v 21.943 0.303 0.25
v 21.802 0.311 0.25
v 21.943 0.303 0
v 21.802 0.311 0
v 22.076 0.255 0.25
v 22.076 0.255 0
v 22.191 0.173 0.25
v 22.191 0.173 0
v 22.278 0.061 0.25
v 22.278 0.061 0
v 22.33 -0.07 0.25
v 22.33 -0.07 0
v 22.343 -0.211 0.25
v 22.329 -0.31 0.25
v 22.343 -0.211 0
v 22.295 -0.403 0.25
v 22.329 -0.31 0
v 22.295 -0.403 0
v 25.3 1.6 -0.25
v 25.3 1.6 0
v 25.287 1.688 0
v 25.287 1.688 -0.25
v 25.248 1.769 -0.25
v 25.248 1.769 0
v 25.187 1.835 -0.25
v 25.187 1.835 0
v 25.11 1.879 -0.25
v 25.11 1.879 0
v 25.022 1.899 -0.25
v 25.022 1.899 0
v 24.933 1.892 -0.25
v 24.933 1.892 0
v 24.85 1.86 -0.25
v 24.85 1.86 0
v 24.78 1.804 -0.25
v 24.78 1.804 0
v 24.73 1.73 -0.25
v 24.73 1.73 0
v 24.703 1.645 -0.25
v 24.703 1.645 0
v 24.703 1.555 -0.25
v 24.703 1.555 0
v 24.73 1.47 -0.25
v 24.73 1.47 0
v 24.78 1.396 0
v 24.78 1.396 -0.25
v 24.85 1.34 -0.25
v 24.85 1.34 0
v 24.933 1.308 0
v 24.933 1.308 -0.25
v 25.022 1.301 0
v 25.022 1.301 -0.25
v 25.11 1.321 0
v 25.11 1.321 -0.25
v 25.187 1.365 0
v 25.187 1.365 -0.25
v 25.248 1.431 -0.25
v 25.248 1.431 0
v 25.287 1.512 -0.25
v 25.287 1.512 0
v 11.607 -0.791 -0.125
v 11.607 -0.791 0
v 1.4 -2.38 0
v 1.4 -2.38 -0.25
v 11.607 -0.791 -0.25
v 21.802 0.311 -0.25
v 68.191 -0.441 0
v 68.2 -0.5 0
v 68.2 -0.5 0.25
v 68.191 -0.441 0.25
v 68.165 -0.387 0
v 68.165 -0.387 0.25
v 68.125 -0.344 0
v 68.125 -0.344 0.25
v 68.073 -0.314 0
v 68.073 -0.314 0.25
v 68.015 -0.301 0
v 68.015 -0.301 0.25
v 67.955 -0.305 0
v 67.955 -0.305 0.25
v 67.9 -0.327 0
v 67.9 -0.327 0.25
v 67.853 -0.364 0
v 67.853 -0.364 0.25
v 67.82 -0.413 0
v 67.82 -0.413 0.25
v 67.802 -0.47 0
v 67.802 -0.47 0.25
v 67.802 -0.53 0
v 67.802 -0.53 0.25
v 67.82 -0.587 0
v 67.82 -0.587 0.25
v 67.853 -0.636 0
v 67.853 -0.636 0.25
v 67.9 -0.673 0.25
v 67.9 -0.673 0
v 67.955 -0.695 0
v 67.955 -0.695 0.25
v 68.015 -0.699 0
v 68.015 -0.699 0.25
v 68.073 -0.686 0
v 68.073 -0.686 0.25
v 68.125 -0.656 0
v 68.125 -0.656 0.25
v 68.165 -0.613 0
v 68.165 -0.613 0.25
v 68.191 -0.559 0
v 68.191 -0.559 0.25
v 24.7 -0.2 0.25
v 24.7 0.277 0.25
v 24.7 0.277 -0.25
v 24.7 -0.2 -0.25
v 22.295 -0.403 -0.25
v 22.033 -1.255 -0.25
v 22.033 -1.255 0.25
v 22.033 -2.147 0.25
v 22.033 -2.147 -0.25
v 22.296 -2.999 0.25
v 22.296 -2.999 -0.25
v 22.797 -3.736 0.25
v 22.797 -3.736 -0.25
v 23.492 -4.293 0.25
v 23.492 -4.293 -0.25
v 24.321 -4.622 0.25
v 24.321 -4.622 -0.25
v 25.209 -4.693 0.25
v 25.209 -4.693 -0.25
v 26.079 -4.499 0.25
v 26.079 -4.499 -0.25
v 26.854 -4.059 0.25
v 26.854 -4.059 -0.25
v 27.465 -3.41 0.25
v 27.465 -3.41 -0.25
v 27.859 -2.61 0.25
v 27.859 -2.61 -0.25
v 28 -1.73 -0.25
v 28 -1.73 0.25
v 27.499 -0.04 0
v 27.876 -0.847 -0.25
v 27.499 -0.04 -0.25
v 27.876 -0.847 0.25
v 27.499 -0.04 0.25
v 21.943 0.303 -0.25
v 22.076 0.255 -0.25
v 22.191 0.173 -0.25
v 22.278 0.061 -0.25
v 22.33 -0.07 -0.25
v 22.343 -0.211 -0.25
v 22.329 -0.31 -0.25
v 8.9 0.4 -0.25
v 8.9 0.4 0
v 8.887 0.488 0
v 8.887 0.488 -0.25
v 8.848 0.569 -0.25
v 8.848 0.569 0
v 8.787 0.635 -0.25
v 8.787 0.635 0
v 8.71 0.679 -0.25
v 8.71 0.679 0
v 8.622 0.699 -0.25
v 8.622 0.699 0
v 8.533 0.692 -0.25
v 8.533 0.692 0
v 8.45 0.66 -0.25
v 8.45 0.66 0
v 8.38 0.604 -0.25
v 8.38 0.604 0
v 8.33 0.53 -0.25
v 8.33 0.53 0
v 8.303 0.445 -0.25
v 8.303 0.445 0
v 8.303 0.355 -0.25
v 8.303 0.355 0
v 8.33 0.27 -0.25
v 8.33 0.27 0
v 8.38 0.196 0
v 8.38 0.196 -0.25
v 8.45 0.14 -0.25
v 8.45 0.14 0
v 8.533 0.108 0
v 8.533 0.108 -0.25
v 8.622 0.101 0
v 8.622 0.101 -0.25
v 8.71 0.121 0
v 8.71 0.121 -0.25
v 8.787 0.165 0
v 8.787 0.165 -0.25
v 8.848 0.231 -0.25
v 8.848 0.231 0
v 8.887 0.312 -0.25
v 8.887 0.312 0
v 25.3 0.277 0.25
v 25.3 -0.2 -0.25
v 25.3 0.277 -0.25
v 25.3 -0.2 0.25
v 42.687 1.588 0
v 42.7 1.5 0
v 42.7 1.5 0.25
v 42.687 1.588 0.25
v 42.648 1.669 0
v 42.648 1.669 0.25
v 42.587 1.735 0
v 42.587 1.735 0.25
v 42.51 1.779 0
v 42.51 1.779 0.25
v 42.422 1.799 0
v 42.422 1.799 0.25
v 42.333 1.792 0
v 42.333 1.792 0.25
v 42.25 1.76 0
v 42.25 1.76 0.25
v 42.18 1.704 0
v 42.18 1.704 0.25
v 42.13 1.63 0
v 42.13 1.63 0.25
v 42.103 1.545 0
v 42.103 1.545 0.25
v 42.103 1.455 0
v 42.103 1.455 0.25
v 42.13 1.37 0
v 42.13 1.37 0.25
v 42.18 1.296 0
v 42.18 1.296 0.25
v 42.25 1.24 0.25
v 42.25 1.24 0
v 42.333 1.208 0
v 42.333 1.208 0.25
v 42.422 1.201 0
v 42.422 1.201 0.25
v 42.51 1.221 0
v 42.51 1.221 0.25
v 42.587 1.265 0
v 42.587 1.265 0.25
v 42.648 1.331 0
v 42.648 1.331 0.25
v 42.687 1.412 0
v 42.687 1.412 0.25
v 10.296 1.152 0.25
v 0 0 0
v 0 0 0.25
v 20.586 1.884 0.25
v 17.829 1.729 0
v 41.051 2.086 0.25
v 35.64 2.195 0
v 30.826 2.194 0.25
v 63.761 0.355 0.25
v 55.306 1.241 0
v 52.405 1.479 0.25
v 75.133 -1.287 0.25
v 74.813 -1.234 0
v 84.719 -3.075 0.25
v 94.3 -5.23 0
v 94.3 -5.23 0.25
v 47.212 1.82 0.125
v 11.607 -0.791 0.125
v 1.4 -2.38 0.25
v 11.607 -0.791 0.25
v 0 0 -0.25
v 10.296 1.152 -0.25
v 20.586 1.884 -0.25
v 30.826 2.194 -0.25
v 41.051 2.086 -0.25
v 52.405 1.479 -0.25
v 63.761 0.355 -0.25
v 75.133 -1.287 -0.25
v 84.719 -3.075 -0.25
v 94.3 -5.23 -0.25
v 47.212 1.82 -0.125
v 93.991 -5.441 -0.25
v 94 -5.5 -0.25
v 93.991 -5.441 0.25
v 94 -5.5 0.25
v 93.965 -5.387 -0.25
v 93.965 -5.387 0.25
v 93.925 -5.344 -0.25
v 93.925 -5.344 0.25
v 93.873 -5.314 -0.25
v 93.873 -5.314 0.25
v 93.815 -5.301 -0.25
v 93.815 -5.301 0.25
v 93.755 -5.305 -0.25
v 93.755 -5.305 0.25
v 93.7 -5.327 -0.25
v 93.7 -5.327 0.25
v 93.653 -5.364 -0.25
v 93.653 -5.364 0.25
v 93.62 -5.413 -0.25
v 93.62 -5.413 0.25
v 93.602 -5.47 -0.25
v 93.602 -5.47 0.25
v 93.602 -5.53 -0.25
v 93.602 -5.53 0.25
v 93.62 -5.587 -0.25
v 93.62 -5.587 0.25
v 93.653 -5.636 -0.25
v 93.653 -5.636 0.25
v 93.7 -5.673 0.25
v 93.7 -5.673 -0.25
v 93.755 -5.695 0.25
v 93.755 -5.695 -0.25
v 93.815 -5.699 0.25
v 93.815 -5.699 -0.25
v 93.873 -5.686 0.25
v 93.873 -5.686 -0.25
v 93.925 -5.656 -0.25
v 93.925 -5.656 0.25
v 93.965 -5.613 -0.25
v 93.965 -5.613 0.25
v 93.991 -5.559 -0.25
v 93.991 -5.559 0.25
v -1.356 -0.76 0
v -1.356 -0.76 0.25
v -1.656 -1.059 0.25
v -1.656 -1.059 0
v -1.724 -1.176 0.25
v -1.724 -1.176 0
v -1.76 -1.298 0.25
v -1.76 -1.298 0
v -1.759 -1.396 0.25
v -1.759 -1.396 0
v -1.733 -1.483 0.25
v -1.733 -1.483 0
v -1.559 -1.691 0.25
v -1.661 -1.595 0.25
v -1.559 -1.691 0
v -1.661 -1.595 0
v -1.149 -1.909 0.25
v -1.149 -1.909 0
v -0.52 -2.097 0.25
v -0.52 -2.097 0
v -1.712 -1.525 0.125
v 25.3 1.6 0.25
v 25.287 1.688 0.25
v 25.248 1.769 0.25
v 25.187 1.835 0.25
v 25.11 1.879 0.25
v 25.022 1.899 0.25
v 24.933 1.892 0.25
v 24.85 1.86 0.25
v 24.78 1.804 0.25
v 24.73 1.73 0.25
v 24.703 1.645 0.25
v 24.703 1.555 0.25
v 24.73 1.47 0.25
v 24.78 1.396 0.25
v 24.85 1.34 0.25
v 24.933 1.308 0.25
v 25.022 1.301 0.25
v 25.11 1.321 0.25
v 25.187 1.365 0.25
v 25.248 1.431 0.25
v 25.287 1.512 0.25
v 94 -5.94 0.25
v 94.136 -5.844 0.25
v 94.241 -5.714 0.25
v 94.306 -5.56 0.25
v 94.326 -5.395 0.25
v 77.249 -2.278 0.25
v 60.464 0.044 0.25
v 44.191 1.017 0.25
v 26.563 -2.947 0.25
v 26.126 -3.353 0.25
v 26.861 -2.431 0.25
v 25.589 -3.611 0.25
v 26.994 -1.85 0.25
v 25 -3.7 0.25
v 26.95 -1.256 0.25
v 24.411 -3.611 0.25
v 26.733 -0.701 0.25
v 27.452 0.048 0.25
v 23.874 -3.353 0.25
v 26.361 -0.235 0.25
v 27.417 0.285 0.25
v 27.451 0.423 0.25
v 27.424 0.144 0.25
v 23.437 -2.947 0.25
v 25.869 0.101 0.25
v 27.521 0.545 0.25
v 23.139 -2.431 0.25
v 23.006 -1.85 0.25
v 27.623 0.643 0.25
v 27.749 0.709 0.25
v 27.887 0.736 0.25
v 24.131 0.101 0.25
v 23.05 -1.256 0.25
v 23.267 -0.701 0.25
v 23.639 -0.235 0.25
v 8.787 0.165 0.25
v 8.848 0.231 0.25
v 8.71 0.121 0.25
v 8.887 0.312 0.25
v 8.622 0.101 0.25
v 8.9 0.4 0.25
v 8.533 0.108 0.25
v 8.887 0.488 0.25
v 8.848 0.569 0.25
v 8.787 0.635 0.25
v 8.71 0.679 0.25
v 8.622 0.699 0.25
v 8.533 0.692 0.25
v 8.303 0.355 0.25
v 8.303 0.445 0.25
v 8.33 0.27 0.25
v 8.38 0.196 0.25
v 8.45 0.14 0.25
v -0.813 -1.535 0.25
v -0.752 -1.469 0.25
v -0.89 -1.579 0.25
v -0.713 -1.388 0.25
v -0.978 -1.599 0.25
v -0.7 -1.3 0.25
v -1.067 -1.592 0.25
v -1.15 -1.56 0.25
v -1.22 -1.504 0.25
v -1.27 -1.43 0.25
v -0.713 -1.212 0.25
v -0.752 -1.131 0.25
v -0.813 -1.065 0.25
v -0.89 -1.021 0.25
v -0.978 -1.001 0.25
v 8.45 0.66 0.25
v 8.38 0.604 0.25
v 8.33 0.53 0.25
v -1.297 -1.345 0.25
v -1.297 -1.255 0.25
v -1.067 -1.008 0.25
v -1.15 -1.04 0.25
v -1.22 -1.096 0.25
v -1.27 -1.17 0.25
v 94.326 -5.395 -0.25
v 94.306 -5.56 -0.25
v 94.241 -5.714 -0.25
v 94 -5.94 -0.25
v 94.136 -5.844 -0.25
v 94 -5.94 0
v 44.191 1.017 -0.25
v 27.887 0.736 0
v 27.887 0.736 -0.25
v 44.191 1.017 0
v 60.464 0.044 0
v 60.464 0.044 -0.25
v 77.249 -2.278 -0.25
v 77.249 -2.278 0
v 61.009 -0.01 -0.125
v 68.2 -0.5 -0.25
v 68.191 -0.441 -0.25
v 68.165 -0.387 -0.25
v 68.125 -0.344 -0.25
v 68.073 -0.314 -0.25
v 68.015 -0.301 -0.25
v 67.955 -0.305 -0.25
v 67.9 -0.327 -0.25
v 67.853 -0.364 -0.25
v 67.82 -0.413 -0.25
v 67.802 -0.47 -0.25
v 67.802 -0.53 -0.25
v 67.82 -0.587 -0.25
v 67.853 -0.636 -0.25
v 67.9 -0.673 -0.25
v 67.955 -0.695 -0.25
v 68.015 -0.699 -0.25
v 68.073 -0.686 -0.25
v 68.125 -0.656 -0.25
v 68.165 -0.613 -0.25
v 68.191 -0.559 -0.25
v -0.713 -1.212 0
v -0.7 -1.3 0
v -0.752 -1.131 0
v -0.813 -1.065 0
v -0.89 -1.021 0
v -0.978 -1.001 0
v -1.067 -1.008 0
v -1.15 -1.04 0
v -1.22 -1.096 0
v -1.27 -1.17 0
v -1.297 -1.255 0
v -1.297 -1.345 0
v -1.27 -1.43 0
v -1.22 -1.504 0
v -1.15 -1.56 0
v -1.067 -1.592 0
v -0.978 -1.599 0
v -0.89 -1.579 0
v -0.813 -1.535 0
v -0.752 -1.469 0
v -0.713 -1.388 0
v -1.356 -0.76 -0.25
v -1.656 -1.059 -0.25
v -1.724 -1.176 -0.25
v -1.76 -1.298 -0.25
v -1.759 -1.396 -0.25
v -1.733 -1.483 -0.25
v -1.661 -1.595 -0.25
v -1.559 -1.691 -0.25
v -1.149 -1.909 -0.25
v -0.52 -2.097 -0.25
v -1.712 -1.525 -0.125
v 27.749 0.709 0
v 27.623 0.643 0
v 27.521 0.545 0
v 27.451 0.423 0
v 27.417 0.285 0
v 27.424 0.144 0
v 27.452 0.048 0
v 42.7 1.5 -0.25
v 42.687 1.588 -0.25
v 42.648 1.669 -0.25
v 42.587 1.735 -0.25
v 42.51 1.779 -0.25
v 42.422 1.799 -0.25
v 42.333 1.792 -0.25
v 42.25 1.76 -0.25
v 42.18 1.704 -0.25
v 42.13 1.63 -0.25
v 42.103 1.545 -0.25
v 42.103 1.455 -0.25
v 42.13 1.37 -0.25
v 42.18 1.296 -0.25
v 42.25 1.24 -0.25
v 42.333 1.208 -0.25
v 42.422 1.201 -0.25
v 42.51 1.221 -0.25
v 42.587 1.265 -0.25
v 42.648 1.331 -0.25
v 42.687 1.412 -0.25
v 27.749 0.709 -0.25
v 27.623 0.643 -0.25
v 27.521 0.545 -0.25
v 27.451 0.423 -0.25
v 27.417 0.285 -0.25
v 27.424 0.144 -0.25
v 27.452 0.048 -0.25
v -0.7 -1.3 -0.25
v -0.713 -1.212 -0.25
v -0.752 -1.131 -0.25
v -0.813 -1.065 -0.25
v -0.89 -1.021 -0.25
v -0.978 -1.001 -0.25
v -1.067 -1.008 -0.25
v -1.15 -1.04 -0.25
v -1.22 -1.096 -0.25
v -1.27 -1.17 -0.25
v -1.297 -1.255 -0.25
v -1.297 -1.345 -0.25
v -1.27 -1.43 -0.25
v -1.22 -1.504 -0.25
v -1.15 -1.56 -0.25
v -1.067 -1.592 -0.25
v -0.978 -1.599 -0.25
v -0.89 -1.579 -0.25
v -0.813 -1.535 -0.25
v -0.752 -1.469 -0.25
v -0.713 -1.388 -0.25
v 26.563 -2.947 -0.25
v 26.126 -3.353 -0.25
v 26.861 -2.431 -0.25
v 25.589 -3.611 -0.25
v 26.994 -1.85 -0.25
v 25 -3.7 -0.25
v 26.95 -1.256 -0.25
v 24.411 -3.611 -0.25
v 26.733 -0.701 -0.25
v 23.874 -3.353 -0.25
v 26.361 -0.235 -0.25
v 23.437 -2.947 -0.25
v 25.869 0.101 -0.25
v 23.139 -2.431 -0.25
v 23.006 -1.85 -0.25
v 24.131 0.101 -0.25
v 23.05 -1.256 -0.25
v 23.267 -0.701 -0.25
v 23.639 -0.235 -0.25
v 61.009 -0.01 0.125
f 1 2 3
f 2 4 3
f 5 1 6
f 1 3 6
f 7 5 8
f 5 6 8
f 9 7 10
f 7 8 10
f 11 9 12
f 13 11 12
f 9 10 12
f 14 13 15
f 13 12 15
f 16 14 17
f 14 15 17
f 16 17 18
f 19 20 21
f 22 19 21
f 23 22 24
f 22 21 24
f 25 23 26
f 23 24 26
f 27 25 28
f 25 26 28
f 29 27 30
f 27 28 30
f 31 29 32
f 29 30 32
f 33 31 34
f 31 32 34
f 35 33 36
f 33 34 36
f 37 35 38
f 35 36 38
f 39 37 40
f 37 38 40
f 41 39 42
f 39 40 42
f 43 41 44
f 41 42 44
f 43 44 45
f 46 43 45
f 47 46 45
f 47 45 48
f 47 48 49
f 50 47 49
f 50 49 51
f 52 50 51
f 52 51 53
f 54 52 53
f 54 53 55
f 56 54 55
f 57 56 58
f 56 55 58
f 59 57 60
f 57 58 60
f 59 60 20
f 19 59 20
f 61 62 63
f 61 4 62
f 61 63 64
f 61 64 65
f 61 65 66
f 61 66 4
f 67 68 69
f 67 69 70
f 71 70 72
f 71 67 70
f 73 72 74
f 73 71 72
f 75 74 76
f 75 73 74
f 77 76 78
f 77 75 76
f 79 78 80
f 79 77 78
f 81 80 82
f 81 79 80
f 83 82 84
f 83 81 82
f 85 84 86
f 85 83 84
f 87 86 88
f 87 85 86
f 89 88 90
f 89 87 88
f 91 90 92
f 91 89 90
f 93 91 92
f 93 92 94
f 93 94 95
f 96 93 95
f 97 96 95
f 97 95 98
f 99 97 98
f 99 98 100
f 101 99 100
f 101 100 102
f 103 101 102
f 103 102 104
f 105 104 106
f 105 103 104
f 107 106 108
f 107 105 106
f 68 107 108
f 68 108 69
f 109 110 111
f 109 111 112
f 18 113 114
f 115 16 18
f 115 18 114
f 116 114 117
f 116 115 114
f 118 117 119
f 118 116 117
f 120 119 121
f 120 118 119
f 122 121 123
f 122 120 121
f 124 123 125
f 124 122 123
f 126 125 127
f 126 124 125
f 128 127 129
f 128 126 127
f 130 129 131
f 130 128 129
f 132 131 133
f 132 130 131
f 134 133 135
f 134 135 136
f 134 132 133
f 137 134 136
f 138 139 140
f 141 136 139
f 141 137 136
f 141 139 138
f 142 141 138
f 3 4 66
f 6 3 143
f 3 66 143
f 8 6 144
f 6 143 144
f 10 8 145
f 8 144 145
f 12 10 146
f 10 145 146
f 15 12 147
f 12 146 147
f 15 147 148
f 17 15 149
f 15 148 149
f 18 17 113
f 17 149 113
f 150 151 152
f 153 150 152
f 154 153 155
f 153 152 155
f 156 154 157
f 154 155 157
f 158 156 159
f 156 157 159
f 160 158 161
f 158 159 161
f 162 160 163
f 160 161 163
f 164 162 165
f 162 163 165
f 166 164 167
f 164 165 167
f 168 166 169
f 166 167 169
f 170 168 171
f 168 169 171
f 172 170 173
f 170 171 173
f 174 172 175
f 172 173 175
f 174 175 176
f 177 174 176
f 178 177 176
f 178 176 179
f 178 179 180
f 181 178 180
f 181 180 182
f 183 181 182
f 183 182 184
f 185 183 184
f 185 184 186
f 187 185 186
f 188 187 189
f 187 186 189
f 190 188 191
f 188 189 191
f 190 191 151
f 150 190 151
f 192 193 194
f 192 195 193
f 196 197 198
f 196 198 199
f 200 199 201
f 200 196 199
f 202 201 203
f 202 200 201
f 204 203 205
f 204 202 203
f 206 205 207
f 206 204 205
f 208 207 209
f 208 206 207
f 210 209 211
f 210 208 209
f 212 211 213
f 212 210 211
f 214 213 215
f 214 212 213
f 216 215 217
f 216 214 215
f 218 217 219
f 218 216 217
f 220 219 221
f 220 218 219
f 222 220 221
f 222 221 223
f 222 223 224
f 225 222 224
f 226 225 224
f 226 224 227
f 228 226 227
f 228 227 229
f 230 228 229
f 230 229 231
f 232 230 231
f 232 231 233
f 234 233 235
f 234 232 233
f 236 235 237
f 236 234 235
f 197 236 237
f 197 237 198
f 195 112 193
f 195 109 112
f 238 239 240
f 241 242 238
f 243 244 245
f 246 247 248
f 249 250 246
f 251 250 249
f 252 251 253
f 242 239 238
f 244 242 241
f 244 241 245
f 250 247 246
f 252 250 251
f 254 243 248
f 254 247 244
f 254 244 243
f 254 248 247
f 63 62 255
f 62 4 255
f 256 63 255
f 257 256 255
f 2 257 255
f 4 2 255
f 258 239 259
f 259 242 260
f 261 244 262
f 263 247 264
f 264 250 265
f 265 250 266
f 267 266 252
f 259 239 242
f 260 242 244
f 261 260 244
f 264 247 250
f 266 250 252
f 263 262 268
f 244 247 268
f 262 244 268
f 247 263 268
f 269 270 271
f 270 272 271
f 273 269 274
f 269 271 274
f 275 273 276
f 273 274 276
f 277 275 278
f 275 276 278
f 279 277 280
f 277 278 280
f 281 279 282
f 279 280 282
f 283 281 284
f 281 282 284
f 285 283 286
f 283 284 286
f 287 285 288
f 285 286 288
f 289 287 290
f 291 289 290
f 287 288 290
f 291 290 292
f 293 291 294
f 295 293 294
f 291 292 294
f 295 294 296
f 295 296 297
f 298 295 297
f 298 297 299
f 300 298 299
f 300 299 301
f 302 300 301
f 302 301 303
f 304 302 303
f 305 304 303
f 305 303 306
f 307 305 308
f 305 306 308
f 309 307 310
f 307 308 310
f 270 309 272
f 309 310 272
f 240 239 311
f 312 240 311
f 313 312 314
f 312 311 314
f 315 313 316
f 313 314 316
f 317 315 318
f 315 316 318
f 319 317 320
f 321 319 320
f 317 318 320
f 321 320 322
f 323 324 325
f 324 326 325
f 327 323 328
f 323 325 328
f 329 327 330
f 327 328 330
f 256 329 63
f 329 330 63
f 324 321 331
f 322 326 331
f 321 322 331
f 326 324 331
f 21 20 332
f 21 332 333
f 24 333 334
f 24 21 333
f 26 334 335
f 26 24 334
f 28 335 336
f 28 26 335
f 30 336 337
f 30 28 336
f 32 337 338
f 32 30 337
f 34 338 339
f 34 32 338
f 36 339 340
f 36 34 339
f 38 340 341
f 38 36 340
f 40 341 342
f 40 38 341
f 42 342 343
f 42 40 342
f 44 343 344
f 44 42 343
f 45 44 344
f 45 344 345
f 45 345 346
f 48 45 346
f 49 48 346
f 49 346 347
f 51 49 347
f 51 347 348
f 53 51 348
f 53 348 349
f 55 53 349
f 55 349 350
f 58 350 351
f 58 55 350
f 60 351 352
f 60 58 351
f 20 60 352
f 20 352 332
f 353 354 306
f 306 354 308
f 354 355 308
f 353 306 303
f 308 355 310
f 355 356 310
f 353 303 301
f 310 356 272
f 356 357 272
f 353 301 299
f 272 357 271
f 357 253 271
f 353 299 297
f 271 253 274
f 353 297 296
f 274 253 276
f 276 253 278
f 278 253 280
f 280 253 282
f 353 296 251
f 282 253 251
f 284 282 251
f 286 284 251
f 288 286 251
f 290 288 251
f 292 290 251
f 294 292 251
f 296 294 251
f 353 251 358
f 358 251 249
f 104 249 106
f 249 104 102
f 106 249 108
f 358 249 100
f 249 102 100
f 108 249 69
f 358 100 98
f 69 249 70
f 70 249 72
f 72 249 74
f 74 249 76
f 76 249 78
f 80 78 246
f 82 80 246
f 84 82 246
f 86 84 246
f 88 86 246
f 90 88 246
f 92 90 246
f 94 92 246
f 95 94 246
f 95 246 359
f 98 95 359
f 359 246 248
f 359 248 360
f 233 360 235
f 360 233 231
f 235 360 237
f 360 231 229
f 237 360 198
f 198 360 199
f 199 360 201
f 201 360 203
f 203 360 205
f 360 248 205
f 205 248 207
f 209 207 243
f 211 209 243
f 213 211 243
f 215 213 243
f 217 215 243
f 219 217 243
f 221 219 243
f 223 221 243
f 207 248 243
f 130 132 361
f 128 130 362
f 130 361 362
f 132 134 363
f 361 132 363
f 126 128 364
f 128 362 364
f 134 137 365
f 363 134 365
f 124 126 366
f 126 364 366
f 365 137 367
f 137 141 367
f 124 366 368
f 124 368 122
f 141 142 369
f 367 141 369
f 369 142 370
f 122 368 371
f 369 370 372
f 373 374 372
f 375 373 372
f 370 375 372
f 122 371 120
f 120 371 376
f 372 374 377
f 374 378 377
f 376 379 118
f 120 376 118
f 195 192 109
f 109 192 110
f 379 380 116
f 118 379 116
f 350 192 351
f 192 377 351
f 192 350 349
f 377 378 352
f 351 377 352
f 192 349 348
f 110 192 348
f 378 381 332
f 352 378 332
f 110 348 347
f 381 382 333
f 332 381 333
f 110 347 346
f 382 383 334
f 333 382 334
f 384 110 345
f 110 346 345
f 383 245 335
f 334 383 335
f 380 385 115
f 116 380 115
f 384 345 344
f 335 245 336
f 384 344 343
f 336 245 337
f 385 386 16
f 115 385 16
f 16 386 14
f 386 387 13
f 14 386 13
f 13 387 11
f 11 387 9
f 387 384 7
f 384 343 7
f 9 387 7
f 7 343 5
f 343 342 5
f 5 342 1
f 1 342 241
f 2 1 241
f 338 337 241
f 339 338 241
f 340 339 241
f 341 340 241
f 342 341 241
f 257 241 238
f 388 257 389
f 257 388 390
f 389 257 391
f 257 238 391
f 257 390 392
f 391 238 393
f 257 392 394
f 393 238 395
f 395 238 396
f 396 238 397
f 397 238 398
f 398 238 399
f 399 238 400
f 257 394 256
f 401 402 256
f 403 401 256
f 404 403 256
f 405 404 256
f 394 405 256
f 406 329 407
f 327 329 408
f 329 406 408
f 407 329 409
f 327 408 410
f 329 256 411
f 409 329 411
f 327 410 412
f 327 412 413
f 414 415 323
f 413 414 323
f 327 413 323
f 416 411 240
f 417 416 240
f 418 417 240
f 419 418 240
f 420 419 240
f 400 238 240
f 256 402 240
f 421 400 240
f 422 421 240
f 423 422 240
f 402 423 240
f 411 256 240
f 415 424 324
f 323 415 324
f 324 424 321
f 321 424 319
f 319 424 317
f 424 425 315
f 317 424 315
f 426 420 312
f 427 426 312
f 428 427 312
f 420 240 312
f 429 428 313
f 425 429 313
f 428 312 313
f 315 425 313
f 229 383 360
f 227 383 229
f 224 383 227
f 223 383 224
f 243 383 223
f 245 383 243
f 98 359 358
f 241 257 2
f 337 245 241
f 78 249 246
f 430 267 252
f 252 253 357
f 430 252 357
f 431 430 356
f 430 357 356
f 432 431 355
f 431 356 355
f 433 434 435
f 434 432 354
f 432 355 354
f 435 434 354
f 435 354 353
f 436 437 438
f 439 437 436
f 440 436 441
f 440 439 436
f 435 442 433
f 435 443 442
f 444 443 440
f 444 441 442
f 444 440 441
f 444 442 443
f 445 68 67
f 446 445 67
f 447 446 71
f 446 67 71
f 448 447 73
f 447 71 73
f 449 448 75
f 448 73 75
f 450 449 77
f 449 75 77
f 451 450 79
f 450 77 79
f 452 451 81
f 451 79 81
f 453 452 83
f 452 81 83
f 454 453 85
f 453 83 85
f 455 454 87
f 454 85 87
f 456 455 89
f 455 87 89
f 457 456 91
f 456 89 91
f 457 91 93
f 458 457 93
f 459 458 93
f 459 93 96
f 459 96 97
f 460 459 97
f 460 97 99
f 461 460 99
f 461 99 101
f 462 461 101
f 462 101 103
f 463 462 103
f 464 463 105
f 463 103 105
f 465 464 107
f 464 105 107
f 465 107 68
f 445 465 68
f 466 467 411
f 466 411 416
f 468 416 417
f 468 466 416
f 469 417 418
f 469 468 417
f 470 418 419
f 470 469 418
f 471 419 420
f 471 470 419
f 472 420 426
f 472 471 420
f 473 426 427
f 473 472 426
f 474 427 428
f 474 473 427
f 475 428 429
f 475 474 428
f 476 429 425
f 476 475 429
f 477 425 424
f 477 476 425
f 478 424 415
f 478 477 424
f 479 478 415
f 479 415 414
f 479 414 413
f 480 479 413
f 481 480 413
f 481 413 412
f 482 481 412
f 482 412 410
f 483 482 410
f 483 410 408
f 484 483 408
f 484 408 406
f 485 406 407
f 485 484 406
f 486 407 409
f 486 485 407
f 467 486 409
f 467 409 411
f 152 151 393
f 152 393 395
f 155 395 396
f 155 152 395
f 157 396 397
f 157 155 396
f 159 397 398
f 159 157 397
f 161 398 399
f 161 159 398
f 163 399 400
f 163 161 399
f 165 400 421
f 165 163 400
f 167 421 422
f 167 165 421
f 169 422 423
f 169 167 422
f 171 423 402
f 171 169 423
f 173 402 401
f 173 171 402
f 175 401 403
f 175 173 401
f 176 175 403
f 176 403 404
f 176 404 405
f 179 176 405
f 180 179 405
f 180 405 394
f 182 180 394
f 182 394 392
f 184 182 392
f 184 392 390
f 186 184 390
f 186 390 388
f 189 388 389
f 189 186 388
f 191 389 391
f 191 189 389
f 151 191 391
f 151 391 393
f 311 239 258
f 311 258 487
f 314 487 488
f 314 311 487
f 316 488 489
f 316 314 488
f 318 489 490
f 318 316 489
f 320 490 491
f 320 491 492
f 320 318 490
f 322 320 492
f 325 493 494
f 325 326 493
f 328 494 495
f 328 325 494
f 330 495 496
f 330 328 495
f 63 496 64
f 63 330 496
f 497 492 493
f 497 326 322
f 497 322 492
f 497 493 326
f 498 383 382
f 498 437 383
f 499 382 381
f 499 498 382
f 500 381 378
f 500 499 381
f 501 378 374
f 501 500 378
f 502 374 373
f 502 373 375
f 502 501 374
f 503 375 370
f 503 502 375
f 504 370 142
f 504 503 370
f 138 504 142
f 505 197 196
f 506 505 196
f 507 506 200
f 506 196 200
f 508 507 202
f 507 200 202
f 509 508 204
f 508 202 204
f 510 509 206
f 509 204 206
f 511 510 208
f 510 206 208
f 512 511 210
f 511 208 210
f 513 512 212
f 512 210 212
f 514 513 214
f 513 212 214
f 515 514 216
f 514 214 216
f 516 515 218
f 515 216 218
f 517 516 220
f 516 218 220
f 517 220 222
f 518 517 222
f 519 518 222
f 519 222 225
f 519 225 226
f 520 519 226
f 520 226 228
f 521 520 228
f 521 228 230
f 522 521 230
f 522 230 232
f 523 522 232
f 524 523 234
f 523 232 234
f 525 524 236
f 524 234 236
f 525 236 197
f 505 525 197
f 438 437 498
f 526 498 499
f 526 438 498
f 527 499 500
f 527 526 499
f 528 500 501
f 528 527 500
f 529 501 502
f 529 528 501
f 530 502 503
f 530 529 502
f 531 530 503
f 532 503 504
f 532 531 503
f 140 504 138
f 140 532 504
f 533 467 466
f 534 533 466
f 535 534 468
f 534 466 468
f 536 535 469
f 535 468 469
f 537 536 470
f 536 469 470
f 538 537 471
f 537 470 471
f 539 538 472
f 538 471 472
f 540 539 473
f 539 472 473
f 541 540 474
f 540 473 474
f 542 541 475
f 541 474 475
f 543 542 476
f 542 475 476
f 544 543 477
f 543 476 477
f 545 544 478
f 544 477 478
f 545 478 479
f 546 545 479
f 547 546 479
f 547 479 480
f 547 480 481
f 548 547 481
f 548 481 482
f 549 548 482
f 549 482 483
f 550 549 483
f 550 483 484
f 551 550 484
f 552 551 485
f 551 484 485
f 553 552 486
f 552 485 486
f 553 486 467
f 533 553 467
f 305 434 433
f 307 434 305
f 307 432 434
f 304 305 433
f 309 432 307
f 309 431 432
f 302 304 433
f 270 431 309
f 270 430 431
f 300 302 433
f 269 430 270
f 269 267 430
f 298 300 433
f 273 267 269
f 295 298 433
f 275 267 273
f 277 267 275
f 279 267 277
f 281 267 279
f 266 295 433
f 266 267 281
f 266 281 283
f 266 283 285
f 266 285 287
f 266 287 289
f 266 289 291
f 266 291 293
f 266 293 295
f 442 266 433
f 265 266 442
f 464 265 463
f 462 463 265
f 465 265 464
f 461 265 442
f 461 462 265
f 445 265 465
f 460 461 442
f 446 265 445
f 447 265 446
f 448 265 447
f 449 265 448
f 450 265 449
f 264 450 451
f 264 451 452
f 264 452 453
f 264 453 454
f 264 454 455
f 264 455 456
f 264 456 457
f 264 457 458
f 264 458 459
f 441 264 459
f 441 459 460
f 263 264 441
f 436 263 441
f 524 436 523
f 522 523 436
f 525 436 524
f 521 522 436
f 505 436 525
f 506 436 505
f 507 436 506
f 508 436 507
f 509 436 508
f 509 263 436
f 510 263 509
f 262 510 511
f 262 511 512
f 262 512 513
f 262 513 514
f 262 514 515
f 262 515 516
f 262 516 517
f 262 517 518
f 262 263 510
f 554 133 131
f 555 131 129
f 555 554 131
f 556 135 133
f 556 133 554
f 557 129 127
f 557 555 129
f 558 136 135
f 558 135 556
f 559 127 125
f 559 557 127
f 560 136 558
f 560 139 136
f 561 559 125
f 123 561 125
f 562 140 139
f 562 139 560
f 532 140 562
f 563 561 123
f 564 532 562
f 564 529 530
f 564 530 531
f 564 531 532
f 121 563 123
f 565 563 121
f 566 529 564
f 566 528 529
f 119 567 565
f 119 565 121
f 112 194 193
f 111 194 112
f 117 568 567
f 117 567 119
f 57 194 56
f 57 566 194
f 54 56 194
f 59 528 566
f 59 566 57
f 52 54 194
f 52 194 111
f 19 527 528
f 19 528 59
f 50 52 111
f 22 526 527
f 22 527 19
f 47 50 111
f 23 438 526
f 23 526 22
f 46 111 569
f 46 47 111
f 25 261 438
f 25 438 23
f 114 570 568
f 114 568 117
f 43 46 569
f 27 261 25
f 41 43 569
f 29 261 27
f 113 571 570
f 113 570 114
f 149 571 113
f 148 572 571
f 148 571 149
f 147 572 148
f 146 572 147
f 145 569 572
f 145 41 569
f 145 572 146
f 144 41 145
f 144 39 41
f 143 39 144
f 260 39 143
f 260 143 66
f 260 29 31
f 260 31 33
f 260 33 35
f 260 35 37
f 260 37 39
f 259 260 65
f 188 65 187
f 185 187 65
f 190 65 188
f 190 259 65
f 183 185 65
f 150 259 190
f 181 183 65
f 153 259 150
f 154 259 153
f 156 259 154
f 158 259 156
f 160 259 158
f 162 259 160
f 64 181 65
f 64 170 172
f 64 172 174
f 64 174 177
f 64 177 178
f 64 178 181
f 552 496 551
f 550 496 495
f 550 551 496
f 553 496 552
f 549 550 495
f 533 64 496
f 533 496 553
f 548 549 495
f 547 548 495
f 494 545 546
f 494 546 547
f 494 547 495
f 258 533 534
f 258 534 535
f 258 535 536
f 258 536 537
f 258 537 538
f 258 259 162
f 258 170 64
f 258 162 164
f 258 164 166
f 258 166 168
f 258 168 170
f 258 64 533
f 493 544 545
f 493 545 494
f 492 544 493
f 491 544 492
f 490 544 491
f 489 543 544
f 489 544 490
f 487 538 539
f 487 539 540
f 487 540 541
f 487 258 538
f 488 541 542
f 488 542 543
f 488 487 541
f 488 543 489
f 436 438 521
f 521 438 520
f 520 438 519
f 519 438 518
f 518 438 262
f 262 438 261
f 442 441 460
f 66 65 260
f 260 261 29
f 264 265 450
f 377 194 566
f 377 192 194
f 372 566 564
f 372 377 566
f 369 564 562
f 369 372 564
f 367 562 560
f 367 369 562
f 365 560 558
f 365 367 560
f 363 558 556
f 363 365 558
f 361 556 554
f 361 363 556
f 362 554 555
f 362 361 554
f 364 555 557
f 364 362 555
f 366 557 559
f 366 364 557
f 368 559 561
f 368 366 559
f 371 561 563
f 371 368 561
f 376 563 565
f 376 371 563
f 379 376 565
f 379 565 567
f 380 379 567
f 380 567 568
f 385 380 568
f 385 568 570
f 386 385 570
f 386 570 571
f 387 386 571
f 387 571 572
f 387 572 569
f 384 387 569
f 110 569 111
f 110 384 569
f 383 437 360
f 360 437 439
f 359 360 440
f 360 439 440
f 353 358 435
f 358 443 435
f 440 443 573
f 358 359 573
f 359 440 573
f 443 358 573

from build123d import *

# Parameters (mm, degrees)
EXTRUDE_1_DEPTH     = 0.25
SKETCH_3_R          = 0.3
SKETCH_3_R_2        = 0.2
CUT_EXTRUDE_1_DEPTH = 0.25
EXTRUDE_2_DEPTH     = 0.25
FILLET_1_R          = 0.5


with BuildPart() as part:
    # 草图2 → 凸台-拉伸1 (new, symmetric)
    with BuildSketch(Plane.XY):
        with BuildLine():
            ThreePointArc((94.3, -5.23), (94.279085645, -5.63954323), (94, -5.94))
            add(Edge.make_bspline(
                [(1.4, -2.38), (47.954561827, 5.976867864), (94, -5.94)],
                knots=[0, 0, 0, 1, 1, 1], degree=2))
            add(Edge.make_bspline(
                [(0, 0), (-4.123736473, -1.859487618), (1.4, -2.38)],
                knots=[0, 0, 0, 1, 1, 1], degree=2))
            add(Edge.make_bspline(
                [(0, 0), (47.273266317, 6.255778848), (94.3, -5.23)],
                knots=[0, 0, 0, 1, 1, 1], degree=2))
        make_face()
    extrude(amount=EXTRUDE_1_DEPTH, both=True)

    # 草图3 → 切除-拉伸1 (cut, symmetric)
    with BuildSketch(Plane.XY):
        with Locations((-1, -1.3)):
            Circle(SKETCH_3_R)
        with Locations((8.6, 0.4)):
            Circle(SKETCH_3_R)
        with Locations((25, 1.6)):
            Circle(SKETCH_3_R)
        with Locations((42.4, 1.5)):
            Circle(SKETCH_3_R)
        with Locations((68, -0.5)):
            Circle(SKETCH_3_R_2)
        with Locations((93.8, -5.5)):
            Circle(SKETCH_3_R_2)
    extrude(amount=CUT_EXTRUDE_1_DEPTH, both=True, mode=Mode.SUBTRACT)

    # 草图4 → 凸台-拉伸2 (add, symmetric)
    with BuildSketch(Plane.XY):
        with BuildLine():
            ThreePointArc((22.854587938, 0.396951856), (25.20918356, -4.692698154), (26.83283005, 0.675022949))
            add(Edge.make_bspline(
                [(22.854587938, 0.396951856), (24.844176287, 0.554595418), (26.83283005, 0.675022949)],
                knots=[0, 0, 0, 1, 1, 1], degree=2))
        make_face()
        with BuildLine():
            Line((24.7, 0.277371993), (24.7, -0.2))
            Line((24.7, -0.2), (25.3, -0.2))
            Line((25.3, -0.2), (25.3, 0.277371993))
            ThreePointArc((25.3, 0.277371993), (25, -3.7), (24.7, 0.277371993))
        make_face(mode=Mode.SUBTRACT)
    extrude(amount=EXTRUDE_2_DEPTH, both=True)

    # 圆角1
    fillet_1_edges = [part.edges().sort_by_distance(p)[0] for p in [
        (26.83283005, 0.675022949, -0.125),
        (22.854587938, 0.396951856, -0.125),
    ]]
    fillet(fillet_1_edges, radius=FILLET_1_R)


solid = part.part
